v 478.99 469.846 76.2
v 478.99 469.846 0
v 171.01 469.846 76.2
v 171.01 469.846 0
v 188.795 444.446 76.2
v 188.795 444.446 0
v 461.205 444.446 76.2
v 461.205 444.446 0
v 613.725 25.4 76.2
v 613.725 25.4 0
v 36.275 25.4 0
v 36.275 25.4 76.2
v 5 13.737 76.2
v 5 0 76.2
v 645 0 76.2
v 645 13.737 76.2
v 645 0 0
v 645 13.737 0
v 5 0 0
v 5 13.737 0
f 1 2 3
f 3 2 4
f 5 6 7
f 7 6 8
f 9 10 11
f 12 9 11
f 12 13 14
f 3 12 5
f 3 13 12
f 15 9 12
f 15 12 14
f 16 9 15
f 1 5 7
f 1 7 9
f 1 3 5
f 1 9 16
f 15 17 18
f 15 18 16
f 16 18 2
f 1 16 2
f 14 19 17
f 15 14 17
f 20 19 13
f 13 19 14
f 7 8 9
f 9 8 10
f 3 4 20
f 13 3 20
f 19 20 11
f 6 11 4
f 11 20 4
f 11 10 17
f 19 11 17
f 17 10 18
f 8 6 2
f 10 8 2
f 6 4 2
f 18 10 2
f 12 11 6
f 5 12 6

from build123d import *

# Parameters (mm, degrees)
SALIENTE_EXTRUIR1_DEPTH = 76.2
CROQUIS2_W              = 5
CROQUIS2_H              = 76.2
CORTAR_EXTRUIR1_DEPTH   = 76.2


with BuildPart() as part:
    # Croquis1 → Saliente-Extruir1 (new body)
    with BuildSketch(Plane.XY):
        Polygon((0, 0), (650, 0), (478.989928337, 469.846310393), (171.010071663, 469.846310393), align=None)
        Polygon((188.795343133, 444.446310393), (461.204656867, 444.446310393), (613.725040629, 25.4), (36.274959371, 25.4), align=None, mode=Mode.SUBTRACT)
    extrude(amount=SALIENTE_EXTRUIR1_DEPTH)

    # Croquis2 → Cortar-Extruir1 (cut)
    with BuildSketch(Plane.XZ):
        with Locations((2.5, 38.1)):
            Rectangle(CROQUIS2_W, CROQUIS2_H)
        with Locations((647.5, 38.1)):
            Rectangle(CROQUIS2_W, CROQUIS2_H)
    extrude(amount=-CORTAR_EXTRUIR1_DEPTH, mode=Mode.SUBTRACT)


solid = part.part
